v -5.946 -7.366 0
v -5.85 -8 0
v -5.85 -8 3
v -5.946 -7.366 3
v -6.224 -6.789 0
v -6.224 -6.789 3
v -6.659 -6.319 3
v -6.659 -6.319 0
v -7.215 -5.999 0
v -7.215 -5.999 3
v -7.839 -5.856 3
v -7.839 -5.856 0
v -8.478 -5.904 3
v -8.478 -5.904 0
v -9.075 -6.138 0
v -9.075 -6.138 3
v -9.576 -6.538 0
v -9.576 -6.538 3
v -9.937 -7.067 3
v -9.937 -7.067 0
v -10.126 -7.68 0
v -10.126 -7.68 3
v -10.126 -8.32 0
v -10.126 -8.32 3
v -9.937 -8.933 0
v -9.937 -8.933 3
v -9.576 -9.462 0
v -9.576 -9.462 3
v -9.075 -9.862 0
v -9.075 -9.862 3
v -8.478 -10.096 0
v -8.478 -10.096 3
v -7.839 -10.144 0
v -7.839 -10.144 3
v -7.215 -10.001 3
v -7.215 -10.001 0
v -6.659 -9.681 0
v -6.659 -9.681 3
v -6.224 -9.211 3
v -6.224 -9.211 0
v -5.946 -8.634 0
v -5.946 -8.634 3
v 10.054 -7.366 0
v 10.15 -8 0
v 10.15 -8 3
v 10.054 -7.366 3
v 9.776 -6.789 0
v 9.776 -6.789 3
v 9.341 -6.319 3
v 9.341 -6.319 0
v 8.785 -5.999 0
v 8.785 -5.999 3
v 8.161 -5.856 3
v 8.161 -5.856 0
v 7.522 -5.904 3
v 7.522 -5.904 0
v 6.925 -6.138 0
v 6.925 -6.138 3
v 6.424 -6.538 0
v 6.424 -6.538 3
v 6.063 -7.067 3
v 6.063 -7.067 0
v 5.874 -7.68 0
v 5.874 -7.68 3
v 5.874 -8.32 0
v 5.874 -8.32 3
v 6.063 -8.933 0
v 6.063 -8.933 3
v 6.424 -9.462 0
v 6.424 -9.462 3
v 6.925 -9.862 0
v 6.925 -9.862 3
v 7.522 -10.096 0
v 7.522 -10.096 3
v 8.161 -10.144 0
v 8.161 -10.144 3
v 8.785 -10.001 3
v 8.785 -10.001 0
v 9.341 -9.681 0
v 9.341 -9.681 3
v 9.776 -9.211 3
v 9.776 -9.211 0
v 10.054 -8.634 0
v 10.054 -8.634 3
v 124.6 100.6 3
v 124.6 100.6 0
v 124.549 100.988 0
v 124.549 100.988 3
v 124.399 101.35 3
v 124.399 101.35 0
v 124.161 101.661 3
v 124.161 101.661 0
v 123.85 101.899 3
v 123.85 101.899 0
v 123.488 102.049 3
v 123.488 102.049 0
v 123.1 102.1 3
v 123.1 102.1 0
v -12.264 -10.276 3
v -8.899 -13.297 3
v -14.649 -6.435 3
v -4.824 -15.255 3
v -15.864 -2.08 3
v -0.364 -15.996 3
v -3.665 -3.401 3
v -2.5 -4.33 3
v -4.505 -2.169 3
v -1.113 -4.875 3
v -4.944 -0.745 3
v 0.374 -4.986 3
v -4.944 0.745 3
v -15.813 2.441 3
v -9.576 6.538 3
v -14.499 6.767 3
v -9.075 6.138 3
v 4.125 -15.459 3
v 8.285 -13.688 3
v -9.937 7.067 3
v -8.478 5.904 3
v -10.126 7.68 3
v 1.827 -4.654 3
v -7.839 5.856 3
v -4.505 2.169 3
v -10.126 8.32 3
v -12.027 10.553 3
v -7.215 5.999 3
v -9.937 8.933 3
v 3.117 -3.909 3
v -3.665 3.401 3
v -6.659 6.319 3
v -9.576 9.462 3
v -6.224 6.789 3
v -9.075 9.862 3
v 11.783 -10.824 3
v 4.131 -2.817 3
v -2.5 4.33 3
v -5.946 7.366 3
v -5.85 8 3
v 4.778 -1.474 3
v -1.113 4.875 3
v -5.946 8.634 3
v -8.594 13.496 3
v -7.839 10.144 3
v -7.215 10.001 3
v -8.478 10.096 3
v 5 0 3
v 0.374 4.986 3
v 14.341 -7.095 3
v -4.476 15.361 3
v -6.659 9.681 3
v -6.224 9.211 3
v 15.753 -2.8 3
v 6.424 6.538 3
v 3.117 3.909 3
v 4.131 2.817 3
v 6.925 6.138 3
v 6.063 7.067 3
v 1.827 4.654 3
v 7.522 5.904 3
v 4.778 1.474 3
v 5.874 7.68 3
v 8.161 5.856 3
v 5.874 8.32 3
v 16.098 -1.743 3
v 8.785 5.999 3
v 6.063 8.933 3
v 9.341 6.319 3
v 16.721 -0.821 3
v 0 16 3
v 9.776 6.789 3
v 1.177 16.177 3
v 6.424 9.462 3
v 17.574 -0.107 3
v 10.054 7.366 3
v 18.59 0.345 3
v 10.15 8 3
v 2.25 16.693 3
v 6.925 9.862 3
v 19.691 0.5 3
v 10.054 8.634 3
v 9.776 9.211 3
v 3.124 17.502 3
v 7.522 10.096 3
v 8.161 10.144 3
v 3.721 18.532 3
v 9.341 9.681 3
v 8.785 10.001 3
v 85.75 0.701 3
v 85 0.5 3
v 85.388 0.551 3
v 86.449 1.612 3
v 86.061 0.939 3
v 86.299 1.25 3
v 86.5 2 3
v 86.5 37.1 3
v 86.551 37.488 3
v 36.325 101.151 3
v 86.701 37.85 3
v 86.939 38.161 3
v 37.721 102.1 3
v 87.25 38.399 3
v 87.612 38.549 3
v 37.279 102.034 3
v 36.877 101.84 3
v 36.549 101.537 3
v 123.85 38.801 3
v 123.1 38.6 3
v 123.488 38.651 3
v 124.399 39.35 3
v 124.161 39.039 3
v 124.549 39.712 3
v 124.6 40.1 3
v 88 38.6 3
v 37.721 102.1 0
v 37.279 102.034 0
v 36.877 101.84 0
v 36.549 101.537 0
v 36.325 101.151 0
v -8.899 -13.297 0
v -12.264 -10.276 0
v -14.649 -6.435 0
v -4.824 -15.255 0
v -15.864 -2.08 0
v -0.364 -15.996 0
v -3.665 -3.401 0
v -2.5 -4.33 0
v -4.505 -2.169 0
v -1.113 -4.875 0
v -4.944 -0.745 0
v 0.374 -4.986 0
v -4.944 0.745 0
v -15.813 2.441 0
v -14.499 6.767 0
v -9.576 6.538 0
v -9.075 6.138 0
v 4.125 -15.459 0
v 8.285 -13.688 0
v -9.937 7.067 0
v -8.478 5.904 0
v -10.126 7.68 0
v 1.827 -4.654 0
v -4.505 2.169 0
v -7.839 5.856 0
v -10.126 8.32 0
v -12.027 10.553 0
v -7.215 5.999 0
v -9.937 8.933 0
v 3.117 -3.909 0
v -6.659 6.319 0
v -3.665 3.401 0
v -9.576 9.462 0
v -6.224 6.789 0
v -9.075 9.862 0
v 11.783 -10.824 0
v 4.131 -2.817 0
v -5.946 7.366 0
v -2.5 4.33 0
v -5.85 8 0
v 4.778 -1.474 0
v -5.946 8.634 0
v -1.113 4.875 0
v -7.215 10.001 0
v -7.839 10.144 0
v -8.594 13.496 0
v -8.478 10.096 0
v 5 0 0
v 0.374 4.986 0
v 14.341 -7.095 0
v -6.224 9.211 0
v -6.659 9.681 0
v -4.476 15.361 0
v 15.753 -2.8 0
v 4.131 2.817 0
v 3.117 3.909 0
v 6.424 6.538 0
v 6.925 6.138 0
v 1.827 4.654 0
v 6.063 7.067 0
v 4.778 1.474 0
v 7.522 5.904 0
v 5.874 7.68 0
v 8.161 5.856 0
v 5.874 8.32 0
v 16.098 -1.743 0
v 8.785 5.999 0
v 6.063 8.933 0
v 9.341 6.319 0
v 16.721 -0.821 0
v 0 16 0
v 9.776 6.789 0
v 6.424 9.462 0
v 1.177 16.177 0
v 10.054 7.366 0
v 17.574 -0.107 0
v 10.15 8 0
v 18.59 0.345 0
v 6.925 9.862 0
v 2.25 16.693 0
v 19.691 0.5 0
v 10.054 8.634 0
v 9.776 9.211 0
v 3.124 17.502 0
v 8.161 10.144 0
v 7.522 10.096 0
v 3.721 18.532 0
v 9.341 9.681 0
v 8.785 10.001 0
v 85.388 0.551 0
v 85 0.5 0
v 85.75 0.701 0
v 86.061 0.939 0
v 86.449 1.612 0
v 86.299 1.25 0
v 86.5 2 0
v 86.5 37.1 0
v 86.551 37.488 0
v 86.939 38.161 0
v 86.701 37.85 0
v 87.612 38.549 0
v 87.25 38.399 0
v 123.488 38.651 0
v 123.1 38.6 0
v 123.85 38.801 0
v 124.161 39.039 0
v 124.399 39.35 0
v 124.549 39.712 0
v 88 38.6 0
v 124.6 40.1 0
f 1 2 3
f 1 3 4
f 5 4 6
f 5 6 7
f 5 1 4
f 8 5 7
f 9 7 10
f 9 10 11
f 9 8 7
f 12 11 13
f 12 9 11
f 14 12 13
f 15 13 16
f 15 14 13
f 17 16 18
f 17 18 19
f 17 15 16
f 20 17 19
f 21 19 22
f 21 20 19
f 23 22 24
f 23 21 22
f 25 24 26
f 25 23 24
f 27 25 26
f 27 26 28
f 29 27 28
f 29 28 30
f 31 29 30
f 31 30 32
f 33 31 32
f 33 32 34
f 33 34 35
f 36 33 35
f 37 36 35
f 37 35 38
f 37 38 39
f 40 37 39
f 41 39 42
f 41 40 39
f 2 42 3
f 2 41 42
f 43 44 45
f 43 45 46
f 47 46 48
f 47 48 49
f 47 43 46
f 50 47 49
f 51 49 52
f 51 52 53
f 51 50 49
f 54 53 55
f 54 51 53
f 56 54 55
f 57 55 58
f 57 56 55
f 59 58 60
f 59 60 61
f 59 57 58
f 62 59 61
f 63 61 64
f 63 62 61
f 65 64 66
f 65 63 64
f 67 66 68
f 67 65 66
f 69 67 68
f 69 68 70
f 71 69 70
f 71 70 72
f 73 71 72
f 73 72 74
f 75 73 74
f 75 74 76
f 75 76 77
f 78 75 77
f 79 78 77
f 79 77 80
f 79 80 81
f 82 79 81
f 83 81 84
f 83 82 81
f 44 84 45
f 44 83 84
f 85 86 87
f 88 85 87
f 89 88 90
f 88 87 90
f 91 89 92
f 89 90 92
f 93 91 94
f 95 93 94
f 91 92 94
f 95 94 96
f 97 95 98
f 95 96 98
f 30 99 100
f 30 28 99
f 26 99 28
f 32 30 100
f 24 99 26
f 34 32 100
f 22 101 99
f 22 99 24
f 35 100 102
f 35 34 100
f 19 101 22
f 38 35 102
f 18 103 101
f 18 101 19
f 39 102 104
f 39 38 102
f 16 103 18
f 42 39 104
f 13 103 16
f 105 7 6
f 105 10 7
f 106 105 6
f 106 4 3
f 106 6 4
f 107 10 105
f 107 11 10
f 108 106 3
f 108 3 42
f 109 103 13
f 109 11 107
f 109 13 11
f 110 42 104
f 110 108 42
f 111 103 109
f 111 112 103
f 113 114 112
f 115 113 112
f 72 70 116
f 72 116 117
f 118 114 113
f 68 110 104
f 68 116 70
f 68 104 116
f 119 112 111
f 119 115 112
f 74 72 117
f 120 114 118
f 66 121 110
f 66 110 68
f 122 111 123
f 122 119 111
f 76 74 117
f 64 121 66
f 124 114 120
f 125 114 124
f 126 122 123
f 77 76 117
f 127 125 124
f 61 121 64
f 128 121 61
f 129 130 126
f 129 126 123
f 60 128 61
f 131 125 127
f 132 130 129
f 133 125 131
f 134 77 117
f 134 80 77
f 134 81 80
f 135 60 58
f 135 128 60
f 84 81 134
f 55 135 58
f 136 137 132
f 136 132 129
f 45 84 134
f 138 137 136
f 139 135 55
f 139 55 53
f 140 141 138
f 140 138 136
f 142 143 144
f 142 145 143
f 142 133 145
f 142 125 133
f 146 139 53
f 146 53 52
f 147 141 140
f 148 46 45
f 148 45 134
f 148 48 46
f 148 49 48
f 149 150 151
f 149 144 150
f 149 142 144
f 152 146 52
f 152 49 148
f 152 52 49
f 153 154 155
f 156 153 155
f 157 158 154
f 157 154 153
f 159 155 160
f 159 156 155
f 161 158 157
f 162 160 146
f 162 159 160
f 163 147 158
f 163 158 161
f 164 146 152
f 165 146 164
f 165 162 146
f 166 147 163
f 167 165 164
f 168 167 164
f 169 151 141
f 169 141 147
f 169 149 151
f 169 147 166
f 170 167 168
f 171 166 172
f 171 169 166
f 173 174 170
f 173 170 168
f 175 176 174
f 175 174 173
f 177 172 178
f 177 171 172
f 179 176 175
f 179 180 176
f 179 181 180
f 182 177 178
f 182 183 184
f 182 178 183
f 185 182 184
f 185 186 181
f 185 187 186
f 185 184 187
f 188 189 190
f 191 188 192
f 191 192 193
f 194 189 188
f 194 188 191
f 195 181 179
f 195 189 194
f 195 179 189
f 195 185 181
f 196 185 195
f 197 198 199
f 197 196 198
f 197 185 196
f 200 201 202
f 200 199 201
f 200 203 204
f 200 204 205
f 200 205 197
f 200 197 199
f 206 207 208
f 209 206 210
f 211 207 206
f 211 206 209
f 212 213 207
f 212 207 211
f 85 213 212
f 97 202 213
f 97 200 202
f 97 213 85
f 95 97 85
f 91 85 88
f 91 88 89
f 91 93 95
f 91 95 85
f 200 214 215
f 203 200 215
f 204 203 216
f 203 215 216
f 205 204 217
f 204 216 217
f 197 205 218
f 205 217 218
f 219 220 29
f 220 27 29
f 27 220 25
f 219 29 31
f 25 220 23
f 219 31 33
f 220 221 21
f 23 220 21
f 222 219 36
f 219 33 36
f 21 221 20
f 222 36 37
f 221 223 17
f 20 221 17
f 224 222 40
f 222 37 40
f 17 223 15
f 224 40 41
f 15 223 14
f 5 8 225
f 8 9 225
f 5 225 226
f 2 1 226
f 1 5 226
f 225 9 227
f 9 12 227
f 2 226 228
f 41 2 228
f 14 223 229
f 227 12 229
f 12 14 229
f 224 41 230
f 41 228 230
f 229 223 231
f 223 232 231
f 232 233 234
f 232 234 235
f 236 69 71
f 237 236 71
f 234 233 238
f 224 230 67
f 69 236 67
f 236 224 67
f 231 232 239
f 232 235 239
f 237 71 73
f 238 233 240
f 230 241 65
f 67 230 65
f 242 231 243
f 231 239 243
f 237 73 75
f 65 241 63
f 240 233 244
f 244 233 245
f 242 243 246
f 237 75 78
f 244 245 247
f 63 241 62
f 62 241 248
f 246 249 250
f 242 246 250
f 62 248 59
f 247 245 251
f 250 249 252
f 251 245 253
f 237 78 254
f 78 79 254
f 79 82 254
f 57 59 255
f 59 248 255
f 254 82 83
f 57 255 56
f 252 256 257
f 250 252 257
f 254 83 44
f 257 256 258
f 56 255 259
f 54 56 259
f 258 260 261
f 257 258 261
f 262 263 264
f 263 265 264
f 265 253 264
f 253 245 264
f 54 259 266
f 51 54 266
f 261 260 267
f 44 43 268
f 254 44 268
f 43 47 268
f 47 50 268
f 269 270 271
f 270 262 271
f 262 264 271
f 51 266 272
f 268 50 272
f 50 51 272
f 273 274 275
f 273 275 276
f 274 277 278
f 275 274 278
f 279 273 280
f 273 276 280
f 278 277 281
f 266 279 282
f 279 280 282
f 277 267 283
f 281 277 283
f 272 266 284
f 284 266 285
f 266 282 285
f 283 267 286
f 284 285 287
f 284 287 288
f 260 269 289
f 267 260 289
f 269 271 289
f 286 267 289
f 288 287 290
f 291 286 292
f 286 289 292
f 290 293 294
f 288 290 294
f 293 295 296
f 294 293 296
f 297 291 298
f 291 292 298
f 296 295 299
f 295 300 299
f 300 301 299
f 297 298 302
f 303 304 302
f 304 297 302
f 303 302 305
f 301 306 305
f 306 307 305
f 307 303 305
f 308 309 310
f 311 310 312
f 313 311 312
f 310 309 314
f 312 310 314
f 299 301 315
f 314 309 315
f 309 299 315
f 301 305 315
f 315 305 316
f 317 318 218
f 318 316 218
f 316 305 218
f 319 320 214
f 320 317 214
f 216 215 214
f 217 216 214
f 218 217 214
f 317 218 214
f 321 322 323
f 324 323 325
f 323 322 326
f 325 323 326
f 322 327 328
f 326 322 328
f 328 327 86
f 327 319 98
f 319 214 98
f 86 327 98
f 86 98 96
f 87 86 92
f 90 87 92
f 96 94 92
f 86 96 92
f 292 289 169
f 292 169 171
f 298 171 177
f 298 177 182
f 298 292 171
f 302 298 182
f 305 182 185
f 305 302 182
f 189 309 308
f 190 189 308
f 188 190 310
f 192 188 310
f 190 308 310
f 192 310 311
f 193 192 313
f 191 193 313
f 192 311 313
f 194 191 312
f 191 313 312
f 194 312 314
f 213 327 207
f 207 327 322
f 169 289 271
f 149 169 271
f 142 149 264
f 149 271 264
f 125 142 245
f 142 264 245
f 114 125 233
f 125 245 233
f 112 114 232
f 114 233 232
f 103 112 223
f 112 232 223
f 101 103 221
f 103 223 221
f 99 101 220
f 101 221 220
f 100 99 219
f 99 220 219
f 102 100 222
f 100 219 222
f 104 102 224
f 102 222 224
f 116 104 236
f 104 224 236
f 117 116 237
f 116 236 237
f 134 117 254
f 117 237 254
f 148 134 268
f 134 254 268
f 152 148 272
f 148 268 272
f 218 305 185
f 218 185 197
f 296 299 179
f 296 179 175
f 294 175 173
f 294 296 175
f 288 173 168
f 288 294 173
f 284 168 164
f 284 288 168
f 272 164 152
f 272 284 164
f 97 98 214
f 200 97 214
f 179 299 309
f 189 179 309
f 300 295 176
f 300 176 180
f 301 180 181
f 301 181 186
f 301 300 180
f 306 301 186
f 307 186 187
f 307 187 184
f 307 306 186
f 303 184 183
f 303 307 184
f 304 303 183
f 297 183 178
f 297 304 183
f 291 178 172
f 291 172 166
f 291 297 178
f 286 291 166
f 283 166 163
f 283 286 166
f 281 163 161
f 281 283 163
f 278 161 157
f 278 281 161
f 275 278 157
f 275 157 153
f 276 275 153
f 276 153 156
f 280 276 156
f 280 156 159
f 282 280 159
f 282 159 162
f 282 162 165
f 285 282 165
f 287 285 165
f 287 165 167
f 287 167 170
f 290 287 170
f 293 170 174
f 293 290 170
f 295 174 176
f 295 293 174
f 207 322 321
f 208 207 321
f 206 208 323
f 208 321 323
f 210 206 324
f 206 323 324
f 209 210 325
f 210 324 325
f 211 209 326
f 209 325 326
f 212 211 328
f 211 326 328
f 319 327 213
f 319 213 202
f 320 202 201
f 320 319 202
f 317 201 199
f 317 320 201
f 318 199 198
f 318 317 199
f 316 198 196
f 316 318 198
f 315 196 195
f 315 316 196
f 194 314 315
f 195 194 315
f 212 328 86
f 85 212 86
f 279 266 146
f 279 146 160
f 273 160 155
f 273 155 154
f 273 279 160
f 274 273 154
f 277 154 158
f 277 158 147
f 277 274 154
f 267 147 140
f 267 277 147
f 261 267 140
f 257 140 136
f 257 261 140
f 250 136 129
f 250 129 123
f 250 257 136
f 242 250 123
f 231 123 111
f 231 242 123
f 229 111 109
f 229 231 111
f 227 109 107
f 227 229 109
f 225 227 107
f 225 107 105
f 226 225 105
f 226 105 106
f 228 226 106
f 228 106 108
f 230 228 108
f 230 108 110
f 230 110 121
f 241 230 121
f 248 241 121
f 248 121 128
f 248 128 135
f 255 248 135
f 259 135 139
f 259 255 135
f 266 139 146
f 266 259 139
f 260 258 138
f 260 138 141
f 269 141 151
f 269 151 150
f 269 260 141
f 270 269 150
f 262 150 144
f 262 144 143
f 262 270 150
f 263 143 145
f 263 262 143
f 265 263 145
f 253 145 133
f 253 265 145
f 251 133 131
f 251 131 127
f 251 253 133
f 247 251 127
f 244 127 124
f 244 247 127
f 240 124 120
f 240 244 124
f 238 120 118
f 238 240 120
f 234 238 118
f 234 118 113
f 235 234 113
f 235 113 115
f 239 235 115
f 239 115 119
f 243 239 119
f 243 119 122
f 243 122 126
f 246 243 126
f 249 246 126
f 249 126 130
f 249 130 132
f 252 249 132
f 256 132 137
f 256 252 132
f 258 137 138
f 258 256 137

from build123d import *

# Parameters (mm, degrees)
SKETCH_R   = 2.15
SKETCH_R_2 = 5
PAD_DEPTH  = 3


with BuildPart() as part:
    # Sketch → Pad (new body)
    with BuildSketch(Plane.XY):
        with BuildLine():
            Line((36.7, 0.5), (85, 0.5))
            ThreePointArc((85, 0.5), (86.06066, 0.93934), (86.5, 2))
            Line((86.5, 2), (86.5, 37.1))
            ThreePointArc((88, 38.6), (86.93934, 38.16066), (86.5, 37.1))
            Line((88, 38.6), (123.1, 38.6))
            ThreePointArc((123.1, 38.6), (124.16066, 39.03934), (124.6, 40.1))
            Line((124.6, 40.1), (124.6, 100.6))
            ThreePointArc((124.6, 100.6), (124.16066, 101.66066), (123.1, 102.1))
            Line((123.1, 102.1), (85, 102.1))
            Line((85, 102.1), (37.720623, 102.1))
            ThreePointArc((37.720623, 102.1), (36.876806, 101.84015), (36.325343, 101.150631))
            Line((3.720746, 18.531652), (36.325343, 101.150631))
            ThreePointArc((0, 16), (2.250179, 16.692932), (3.720746, 18.531652))
            ThreePointArc((0, 16), (-12.263768, -10.276186), (15.753095, -2.8))
            ThreePointArc((19.691369, 0.5), (17.122322, -0.434058), (15.753095, -2.8))
            Line((36.7, 0.5), (19.691369, 0.5))
        make_face()
        with Locations((-8, 8)):
            Circle(SKETCH_R, mode=Mode.SUBTRACT)
        with Locations((8, 8)):
            Circle(SKETCH_R, mode=Mode.SUBTRACT)
        with Locations((-8, -8)):
            Circle(SKETCH_R, mode=Mode.SUBTRACT)
        with Locations((8, -8)):
            Circle(SKETCH_R, mode=Mode.SUBTRACT)
        Circle(SKETCH_R_2, mode=Mode.SUBTRACT)
    extrude(amount=PAD_DEPTH)


solid = part.part
